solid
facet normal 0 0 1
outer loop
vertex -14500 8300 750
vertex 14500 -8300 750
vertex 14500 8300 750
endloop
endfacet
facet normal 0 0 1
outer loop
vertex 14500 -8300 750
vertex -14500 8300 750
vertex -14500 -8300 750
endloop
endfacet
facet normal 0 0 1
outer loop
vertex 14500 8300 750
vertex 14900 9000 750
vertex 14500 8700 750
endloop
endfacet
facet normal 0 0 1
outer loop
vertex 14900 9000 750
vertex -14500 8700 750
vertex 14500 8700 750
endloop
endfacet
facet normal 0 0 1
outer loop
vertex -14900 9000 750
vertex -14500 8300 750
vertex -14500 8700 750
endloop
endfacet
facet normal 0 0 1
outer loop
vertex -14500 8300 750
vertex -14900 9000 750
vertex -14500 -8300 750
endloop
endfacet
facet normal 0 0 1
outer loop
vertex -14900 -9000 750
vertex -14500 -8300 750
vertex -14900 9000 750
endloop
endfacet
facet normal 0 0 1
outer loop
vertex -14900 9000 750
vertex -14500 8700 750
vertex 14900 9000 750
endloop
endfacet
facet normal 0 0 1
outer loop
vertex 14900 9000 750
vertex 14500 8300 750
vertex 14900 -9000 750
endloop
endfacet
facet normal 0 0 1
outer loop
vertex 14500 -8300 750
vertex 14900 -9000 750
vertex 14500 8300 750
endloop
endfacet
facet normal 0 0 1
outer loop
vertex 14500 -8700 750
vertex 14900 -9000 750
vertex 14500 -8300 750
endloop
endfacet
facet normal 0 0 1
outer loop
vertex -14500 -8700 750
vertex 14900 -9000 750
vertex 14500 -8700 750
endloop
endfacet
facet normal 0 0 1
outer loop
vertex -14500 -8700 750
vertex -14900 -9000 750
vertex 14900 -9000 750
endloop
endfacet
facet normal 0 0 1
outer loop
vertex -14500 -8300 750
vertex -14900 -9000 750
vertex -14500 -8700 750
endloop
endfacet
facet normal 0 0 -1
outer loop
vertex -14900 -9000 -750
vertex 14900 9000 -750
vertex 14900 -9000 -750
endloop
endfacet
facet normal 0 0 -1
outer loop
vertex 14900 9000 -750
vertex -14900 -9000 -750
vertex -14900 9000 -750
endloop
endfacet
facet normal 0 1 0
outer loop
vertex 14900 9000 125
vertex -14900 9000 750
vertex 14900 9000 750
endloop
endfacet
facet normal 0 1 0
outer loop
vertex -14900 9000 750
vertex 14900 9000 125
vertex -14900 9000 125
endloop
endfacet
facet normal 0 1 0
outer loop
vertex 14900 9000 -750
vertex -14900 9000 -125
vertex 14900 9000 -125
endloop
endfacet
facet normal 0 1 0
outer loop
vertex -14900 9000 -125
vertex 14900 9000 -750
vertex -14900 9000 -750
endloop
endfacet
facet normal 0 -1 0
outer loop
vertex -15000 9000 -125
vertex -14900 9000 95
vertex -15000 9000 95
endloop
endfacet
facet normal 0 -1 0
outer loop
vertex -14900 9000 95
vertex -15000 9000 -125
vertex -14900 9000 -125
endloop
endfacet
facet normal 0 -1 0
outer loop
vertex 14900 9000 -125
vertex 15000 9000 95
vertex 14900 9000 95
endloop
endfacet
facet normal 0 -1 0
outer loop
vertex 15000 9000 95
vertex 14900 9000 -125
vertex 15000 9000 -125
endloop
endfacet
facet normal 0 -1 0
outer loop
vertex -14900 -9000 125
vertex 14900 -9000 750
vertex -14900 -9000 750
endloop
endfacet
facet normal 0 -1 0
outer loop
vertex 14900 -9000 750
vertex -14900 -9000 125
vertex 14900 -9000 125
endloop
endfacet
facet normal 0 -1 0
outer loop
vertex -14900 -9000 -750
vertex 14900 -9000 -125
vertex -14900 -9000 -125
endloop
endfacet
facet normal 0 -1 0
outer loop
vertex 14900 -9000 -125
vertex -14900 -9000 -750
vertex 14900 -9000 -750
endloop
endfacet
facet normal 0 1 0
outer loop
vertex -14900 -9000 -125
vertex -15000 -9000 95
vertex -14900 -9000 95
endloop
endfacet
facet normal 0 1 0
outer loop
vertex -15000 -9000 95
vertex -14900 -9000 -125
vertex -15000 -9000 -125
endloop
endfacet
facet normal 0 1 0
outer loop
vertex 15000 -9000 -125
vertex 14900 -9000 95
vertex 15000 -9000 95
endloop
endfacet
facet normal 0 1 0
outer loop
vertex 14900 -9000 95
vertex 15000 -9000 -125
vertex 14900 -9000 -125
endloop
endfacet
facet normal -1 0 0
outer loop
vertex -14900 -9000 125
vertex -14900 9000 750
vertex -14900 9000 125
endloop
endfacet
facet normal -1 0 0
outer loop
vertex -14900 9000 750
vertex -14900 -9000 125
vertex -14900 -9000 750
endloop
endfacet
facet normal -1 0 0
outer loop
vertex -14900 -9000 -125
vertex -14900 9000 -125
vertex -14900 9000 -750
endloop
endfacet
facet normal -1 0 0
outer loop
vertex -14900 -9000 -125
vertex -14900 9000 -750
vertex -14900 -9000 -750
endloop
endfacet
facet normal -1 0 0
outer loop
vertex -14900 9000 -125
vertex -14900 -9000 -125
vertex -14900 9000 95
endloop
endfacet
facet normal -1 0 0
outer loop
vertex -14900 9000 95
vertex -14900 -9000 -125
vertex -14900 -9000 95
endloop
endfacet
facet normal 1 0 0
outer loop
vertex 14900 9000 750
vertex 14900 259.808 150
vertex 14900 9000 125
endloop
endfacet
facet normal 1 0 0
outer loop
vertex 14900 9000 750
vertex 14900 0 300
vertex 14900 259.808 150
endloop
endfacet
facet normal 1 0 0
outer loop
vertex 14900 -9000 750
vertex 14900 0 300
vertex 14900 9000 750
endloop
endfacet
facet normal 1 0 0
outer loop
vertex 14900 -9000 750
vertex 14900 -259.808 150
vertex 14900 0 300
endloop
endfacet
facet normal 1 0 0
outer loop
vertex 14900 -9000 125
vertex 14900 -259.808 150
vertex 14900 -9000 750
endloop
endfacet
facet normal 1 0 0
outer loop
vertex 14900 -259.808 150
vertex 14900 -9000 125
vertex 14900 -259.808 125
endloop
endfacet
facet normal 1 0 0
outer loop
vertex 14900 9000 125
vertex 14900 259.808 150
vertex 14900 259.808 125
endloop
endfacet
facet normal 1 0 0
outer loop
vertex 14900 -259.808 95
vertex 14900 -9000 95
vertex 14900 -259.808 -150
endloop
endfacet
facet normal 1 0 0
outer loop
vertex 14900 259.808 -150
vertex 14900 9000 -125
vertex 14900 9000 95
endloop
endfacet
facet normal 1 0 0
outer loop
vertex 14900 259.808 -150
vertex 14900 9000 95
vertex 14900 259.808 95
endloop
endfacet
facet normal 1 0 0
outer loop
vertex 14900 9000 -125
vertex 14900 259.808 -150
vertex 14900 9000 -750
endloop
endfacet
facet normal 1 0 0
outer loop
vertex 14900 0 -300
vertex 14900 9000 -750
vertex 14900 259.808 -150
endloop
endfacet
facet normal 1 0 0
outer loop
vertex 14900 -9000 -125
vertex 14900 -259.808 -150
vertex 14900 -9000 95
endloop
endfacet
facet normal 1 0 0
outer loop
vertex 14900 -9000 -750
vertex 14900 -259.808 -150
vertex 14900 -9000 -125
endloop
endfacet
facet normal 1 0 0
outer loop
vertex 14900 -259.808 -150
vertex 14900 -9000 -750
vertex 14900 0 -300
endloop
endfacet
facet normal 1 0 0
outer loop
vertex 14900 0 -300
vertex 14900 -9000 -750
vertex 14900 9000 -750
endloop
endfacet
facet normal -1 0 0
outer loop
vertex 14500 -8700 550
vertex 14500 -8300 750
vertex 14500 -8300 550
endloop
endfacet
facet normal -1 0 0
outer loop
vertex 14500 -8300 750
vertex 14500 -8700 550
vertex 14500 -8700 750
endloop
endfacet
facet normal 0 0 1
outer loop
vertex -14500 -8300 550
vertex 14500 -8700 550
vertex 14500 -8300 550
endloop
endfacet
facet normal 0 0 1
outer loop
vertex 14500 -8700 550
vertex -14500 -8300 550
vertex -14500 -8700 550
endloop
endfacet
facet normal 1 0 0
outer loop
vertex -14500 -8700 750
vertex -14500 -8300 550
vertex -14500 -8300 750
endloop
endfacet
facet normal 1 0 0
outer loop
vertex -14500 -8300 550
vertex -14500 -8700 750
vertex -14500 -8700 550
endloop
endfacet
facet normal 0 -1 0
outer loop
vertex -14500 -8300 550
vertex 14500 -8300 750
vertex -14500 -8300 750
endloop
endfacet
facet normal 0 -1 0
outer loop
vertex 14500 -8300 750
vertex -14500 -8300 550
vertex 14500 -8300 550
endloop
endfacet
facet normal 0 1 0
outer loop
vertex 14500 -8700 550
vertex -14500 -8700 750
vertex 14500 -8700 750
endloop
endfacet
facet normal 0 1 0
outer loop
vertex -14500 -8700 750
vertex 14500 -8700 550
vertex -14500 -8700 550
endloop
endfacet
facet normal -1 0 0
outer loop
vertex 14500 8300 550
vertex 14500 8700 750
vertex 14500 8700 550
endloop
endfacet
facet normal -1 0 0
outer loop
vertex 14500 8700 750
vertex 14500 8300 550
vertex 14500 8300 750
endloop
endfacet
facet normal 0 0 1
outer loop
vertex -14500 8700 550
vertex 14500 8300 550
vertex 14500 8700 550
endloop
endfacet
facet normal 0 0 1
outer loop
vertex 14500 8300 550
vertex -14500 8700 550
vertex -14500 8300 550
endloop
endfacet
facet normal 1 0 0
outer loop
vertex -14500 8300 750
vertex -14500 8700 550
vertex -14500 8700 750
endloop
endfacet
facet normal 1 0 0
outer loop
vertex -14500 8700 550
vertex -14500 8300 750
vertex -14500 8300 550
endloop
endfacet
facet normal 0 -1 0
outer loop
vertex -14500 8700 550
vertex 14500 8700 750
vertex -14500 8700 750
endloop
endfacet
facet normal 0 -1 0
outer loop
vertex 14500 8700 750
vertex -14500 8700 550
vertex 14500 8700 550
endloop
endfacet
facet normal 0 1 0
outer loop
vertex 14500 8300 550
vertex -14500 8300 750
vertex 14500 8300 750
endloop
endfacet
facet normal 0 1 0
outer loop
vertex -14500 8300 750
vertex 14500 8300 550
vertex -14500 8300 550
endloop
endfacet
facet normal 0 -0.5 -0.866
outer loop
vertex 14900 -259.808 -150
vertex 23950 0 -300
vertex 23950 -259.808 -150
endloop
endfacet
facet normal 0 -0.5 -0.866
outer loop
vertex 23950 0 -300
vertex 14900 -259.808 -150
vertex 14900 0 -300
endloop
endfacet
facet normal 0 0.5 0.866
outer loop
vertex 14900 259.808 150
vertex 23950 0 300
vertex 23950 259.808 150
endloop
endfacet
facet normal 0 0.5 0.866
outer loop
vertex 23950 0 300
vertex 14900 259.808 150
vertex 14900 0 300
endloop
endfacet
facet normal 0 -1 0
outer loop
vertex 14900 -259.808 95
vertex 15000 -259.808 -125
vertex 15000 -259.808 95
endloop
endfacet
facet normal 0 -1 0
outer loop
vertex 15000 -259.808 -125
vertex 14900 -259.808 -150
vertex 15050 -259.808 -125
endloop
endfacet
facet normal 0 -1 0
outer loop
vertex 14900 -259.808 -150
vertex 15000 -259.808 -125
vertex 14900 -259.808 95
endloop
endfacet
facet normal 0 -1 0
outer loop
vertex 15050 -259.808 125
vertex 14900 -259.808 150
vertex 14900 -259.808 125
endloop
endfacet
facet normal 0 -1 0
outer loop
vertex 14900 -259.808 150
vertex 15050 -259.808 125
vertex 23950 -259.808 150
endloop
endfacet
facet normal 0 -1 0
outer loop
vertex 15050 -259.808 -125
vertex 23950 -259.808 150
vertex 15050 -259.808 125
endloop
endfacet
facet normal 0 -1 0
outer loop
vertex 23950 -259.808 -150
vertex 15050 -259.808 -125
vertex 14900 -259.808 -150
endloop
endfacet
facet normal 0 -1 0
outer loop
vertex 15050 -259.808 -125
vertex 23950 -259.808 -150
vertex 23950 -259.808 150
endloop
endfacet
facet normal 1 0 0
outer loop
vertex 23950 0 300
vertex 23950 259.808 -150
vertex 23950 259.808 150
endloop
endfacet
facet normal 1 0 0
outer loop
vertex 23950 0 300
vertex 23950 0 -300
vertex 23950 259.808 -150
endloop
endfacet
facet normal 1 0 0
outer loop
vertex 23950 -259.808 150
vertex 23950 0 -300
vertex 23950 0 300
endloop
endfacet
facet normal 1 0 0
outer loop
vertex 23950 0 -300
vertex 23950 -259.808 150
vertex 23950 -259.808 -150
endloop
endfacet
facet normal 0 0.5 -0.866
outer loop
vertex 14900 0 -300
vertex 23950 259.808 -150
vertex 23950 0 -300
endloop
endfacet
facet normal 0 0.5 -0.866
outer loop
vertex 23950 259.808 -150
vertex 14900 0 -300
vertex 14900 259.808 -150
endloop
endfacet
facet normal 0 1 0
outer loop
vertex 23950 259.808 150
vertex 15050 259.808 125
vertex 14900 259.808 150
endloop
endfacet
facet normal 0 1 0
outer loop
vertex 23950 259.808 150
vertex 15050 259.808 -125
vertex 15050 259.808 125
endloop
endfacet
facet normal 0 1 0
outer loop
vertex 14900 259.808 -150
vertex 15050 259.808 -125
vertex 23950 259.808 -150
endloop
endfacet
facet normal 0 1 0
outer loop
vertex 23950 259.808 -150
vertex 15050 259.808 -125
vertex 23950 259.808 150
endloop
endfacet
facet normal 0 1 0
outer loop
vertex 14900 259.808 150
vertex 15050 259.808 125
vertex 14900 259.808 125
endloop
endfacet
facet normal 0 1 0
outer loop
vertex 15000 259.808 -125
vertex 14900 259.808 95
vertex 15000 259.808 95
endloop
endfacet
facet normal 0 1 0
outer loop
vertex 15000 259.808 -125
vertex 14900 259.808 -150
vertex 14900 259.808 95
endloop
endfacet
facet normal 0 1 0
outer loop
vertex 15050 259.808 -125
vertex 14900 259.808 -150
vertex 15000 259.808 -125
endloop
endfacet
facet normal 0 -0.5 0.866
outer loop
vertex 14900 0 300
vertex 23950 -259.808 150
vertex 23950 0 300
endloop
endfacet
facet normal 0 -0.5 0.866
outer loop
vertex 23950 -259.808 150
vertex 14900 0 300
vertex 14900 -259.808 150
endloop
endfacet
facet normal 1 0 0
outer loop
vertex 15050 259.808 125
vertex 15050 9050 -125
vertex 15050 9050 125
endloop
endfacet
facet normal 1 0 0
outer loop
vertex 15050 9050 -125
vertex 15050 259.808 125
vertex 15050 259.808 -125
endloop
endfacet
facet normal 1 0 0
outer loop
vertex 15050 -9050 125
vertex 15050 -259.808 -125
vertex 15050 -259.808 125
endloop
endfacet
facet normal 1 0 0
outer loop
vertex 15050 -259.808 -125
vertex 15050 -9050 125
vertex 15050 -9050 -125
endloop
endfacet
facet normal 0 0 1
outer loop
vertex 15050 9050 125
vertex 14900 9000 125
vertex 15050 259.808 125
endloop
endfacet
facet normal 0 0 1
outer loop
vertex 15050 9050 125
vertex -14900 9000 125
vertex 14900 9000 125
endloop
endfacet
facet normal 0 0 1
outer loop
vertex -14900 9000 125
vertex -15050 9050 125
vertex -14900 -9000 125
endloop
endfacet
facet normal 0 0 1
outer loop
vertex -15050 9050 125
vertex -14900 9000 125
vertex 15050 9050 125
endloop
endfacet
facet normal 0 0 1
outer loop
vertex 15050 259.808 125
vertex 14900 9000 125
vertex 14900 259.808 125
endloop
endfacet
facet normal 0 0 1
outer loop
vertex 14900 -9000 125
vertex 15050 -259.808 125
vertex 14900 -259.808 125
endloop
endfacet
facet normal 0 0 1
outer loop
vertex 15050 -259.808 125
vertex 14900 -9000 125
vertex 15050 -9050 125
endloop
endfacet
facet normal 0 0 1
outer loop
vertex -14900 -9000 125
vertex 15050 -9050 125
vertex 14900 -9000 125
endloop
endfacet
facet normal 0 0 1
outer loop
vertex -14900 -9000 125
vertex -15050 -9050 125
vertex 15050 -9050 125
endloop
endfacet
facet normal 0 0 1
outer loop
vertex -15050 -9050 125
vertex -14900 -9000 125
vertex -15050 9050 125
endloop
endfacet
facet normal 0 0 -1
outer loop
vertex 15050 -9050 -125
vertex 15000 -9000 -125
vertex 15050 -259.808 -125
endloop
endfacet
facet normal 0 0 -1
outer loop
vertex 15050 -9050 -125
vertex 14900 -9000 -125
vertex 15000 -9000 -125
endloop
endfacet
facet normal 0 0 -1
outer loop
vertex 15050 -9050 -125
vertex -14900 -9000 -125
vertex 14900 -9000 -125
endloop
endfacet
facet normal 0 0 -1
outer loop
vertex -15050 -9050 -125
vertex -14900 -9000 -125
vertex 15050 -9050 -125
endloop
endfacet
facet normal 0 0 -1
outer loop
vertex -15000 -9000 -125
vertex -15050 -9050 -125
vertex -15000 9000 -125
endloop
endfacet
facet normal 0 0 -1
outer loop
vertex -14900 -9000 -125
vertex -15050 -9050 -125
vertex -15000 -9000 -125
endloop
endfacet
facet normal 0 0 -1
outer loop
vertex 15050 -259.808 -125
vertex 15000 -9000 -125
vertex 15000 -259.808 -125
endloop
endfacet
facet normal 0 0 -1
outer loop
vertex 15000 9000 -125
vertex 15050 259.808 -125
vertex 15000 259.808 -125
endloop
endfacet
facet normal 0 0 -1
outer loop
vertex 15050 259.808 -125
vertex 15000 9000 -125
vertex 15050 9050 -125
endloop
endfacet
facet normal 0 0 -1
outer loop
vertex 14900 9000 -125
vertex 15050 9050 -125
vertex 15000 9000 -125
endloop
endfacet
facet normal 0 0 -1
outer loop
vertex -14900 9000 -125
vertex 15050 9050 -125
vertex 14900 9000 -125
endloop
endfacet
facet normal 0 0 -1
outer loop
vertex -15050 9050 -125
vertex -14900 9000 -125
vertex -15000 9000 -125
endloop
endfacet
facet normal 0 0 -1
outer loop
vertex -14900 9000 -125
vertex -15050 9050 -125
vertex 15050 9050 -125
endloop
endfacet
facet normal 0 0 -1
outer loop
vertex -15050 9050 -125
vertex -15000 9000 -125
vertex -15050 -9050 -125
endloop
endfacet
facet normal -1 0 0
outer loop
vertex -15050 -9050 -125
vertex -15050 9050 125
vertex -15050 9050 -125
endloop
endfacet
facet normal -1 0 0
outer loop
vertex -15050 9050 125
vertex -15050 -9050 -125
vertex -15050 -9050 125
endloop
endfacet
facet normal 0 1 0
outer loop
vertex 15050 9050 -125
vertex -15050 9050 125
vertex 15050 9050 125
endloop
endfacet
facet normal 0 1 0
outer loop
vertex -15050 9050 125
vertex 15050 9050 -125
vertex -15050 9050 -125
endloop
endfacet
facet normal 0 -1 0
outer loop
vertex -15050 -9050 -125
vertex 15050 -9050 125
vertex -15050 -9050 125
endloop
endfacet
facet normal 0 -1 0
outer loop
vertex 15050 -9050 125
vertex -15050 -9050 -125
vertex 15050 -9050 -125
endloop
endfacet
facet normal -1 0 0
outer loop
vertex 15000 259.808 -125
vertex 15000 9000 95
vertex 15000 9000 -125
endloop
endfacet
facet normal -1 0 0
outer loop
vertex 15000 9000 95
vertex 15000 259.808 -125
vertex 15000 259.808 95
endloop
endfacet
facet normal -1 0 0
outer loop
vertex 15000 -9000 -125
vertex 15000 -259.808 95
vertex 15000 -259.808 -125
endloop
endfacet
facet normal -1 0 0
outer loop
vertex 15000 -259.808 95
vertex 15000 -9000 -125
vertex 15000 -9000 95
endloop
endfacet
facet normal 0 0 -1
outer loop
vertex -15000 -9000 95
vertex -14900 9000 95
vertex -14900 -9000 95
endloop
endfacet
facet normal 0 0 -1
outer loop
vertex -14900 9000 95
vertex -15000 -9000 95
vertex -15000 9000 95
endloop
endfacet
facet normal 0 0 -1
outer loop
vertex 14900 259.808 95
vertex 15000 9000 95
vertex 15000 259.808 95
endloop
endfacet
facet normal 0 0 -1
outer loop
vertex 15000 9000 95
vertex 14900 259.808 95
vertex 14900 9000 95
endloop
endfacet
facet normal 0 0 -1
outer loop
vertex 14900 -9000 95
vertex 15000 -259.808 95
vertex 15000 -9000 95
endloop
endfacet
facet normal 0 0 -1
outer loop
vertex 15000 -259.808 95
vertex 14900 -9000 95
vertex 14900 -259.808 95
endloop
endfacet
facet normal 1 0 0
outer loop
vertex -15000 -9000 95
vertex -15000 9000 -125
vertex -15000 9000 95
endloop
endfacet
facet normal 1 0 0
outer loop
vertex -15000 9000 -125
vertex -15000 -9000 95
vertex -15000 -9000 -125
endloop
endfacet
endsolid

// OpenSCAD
// file: carrier_deck.scad
// =========================================================================
// GRUMMAN-STYLED EMERGENCY INFLATABLE CARRIER - FLATBED FLUSH-DECK PLATFORM
// MANUFACTURER: HUNTINGTON INGALLS / NEWPORT NEWS SHIPBUILDING
// MECHANICAL BLUEPRINT SPECIFICATION: ACCORDION LANDING PLATFORM
// =========================================================================

module carrier_plate_module(length=30000, width=18000, thickness=1500) {
    difference() {
        // Main Flatbed Drop-Stitch Slab Core (No Tower, No Turret Obstructions)
        cube([length, width, thickness], center=true);
        
        // Passive Hinge Clearances for Accordion-Style Stacking
        translate([-length/2, 0, 0])
            cube([200, width+10, thickness+10], center=true);
        translate([length/2, 0, 0])
            cube([200, width+10, thickness+10], center=true);
            
        // Integrated Low-Profile Left/Right Sump Trenches for Bilge Collection
        translate([0, -width/2 + 500, thickness/2 - 100])
            cube([length - 1000, 400, 200], center=true);
        translate([0, width/2 - 500, thickness/2 - 100])
            cube([length - 1000, 400, 200], center=true);
    }
    
    // Huntington Ingalls Gravity-Drop Tongue-and-Groove Passive Interlocks
    translate([length/2 - 50, 0, 0])
        tongue_interlock_joint(width);
}

module tongue_interlock_joint(joint_width) {
    // Solid wedge joint profile that jams locked under gravity drop action
    rotate([0, 90, 0])
        cylinder(h=100, r=300, h=joint_width, center=true, $fn=6);
}

// Render primary operational flatbed segment
carrier_plate_module();
// main file
// =========================================================================
// GRUMMAN-STYLED INFLATABLE CARRIER - TITANIUM ENCLOSURE BLUEPRINT
// MANUFACTURER: HUNTINGTON INGALLS / NEWPORT NEWS SHIPBUILDING
// MATERIAL PROFILE: GRADE 5 TITANIUM (Ti-6Al-4V) SPECIFICATION
// =========================================================================

include <carrier_deck.scad>

// Optimized Titanium Geometry Metrics (Reduced thickness due to high tensile strength)
length = 30000;
width = 18000;
thickness = 250; // Thinned from 400mm to optimize SWaP-C with Titanium Strength

module titanium_carrier_top_lid(l=length, w=width, t=thickness) {
    difference() {
        // Solid Titanium Protection Shell Matrix (Ti-6Al-4V)
        cube([l + 100, w + 100, t], center=true);
        
        // Internal Pocket Clearance for Vacuum-Flattened Accordion Plates
        translate([0, 0, -30])
            cube([l, w, t], center=true);
    }
    
    // Titanium-Reinforced Mounting Bosses for SNAP-CIRCUITS Power Blocks
    translate([-l/4, -w/4, -t/2 + 30]) titanium_circuit_boss();
    translate([l/4, -w/4, -t/2 + 30])  titanium_circuit_boss();
    translate([-l/4, w/4, -t/2 + 30])  titanium_circuit_boss();
    translate([l/4, w/4, -t/2 + 30])   titanium_circuit_boss();
}

module titanium_circuit_boss(boss_radius=120, boss_height=80) {
    // Threaded titanium bosses with integrated analog Guard Ring isolation barriers
    difference() {
        cylinder(h=boss_height, r=boss_radius, center=true, $fn=64);
        cylinder(h=boss_height + 10, r=boss_radius - 40, center=true, $fn=64);
    }
}

// Render upgraded Titanium Flatbed Top Lid
titanium_carrier_top_lid();
